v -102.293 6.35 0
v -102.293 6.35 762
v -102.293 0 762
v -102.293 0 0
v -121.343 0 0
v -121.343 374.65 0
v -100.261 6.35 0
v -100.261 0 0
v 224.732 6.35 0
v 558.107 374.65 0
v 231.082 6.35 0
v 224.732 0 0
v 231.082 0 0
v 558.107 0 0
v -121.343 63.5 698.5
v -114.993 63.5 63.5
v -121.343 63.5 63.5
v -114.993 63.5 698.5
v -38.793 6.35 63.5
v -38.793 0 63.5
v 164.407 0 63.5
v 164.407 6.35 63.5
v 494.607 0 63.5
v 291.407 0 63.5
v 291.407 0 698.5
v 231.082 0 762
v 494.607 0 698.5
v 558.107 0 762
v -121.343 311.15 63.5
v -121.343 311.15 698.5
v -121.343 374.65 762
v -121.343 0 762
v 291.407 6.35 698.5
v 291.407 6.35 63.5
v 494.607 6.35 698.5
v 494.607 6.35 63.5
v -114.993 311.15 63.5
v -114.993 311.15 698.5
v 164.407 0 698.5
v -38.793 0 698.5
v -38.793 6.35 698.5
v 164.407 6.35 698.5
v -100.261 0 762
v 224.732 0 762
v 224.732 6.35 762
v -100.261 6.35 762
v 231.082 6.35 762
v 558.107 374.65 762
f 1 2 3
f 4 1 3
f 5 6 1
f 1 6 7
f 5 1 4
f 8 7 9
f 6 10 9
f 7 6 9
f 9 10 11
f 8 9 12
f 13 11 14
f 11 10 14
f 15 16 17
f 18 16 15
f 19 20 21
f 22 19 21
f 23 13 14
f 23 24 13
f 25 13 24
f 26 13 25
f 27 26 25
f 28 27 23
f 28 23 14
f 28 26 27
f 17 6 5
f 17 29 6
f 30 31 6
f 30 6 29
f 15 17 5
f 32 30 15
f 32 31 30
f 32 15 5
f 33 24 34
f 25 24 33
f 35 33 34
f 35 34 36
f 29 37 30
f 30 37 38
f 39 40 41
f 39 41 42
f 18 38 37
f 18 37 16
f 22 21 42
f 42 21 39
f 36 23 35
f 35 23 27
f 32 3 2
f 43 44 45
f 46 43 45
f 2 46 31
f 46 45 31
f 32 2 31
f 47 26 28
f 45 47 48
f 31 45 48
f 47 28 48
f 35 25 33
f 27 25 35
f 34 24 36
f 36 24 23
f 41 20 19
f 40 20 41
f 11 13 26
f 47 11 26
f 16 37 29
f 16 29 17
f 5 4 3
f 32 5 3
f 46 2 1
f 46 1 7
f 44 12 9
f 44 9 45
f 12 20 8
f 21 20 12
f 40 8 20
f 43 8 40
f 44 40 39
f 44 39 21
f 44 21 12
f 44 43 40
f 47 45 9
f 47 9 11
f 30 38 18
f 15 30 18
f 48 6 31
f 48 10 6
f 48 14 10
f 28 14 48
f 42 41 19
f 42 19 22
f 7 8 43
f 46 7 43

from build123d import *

# Parameters (mm, degrees)
F0_W     = 327.025
F0_H     = 762
F0_W_2   = 203.2
F0_H_2   = 635
F0_W_3   = 324.993
F0_W_4   = 3.175
F0_W_5   = 2.032
F1_DEPTH = 374.65
F2_DEPTH = 6.35
F3_W     = 368.3
F3_H     = 762
F3_W_2   = 247.65
F3_H_2   = 635
F3_W_3   = 6.35
F4_DEPTH = 19.05
F5_DEPTH = 12.7


# Not quite as in the source:
# - a feature names something its author has since deleted; it is built from what else it names


with BuildPart() as f1:
    # F0 (on Front) → F1 (new body)
    with BuildSketch(Plane.XZ):
        with Locations((394.5947425127, 381)):
            Rectangle(F0_W, F0_H)
        with Locations((393.0072425127, 381)):
            Rectangle(F0_W_2, F0_H_2, mode=Mode.SUBTRACT)
        with Locations((62.2357425127, 381)):
            Rectangle(F0_W_3, F0_H)
        with Locations((62.8072425127, 381)):
            Rectangle(F0_W_2, F0_H_2, mode=Mode.SUBTRACT)
        with Locations((62.8072425127, 381)):
            Rectangle(F0_W_2, F0_H_2)
        with Locations((393.0072425127, 381)):
            Rectangle(F0_W_2, F0_H_2)
        with Locations((226.3197425127, 381)):
            Rectangle(F0_W_4, F0_H)
        with Locations((229.4947425127, 381)):
            Rectangle(F0_W_4, F0_H)
        with Locations((-101.2767574873, 381)):
            Rectangle(F0_W_5, F0_H)
    extrude(amount=-F1_DEPTH)

    # F0 (on Front) → F2 (cut)
    with BuildSketch(Plane.XZ):
        with Locations((226.3197425127, 381)):
            Rectangle(F0_W_4, F0_H)
        with Locations((229.4947425127, 381)):
            Rectangle(F0_W_4, F0_H)
        with Locations((-101.2767574873, 381)):
            Rectangle(F0_W_5, F0_H)
        with Locations((62.8072425127, 381)):
            Rectangle(F0_W_2, F0_H_2)
        with Locations((393.0072425127, 381)):
            Rectangle(F0_W_2, F0_H_2)
    extrude(amount=-F2_DEPTH, mode=Mode.SUBTRACT)

    # F3 (on face) → F4 (join)
    with BuildSketch(Plane(origin=(-102.2927574873, 0, 0), x_dir=(0, -1, 0), z_dir=(-1, 0, 0))):
        with Locations((-190.5, 381)):
            Rectangle(F3_W, F3_H)
        with Locations((-187.325, 381)):
            Rectangle(F3_W_2, F3_H_2, mode=Mode.SUBTRACT)
        with Locations((-3.175, 381)):
            Rectangle(F3_W_3, F3_H)
    extrude(amount=F4_DEPTH)

    # F3 (on face) → F5 (join)
    with BuildSketch(Plane(origin=(-102.2927574873, 0, 0), x_dir=(0, -1, 0), z_dir=(-1, 0, 0))):
        with Locations((-187.325, 381)):
            Rectangle(F3_W_2, F3_H_2)
    extrude(amount=F5_DEPTH)


solid = f1.part
